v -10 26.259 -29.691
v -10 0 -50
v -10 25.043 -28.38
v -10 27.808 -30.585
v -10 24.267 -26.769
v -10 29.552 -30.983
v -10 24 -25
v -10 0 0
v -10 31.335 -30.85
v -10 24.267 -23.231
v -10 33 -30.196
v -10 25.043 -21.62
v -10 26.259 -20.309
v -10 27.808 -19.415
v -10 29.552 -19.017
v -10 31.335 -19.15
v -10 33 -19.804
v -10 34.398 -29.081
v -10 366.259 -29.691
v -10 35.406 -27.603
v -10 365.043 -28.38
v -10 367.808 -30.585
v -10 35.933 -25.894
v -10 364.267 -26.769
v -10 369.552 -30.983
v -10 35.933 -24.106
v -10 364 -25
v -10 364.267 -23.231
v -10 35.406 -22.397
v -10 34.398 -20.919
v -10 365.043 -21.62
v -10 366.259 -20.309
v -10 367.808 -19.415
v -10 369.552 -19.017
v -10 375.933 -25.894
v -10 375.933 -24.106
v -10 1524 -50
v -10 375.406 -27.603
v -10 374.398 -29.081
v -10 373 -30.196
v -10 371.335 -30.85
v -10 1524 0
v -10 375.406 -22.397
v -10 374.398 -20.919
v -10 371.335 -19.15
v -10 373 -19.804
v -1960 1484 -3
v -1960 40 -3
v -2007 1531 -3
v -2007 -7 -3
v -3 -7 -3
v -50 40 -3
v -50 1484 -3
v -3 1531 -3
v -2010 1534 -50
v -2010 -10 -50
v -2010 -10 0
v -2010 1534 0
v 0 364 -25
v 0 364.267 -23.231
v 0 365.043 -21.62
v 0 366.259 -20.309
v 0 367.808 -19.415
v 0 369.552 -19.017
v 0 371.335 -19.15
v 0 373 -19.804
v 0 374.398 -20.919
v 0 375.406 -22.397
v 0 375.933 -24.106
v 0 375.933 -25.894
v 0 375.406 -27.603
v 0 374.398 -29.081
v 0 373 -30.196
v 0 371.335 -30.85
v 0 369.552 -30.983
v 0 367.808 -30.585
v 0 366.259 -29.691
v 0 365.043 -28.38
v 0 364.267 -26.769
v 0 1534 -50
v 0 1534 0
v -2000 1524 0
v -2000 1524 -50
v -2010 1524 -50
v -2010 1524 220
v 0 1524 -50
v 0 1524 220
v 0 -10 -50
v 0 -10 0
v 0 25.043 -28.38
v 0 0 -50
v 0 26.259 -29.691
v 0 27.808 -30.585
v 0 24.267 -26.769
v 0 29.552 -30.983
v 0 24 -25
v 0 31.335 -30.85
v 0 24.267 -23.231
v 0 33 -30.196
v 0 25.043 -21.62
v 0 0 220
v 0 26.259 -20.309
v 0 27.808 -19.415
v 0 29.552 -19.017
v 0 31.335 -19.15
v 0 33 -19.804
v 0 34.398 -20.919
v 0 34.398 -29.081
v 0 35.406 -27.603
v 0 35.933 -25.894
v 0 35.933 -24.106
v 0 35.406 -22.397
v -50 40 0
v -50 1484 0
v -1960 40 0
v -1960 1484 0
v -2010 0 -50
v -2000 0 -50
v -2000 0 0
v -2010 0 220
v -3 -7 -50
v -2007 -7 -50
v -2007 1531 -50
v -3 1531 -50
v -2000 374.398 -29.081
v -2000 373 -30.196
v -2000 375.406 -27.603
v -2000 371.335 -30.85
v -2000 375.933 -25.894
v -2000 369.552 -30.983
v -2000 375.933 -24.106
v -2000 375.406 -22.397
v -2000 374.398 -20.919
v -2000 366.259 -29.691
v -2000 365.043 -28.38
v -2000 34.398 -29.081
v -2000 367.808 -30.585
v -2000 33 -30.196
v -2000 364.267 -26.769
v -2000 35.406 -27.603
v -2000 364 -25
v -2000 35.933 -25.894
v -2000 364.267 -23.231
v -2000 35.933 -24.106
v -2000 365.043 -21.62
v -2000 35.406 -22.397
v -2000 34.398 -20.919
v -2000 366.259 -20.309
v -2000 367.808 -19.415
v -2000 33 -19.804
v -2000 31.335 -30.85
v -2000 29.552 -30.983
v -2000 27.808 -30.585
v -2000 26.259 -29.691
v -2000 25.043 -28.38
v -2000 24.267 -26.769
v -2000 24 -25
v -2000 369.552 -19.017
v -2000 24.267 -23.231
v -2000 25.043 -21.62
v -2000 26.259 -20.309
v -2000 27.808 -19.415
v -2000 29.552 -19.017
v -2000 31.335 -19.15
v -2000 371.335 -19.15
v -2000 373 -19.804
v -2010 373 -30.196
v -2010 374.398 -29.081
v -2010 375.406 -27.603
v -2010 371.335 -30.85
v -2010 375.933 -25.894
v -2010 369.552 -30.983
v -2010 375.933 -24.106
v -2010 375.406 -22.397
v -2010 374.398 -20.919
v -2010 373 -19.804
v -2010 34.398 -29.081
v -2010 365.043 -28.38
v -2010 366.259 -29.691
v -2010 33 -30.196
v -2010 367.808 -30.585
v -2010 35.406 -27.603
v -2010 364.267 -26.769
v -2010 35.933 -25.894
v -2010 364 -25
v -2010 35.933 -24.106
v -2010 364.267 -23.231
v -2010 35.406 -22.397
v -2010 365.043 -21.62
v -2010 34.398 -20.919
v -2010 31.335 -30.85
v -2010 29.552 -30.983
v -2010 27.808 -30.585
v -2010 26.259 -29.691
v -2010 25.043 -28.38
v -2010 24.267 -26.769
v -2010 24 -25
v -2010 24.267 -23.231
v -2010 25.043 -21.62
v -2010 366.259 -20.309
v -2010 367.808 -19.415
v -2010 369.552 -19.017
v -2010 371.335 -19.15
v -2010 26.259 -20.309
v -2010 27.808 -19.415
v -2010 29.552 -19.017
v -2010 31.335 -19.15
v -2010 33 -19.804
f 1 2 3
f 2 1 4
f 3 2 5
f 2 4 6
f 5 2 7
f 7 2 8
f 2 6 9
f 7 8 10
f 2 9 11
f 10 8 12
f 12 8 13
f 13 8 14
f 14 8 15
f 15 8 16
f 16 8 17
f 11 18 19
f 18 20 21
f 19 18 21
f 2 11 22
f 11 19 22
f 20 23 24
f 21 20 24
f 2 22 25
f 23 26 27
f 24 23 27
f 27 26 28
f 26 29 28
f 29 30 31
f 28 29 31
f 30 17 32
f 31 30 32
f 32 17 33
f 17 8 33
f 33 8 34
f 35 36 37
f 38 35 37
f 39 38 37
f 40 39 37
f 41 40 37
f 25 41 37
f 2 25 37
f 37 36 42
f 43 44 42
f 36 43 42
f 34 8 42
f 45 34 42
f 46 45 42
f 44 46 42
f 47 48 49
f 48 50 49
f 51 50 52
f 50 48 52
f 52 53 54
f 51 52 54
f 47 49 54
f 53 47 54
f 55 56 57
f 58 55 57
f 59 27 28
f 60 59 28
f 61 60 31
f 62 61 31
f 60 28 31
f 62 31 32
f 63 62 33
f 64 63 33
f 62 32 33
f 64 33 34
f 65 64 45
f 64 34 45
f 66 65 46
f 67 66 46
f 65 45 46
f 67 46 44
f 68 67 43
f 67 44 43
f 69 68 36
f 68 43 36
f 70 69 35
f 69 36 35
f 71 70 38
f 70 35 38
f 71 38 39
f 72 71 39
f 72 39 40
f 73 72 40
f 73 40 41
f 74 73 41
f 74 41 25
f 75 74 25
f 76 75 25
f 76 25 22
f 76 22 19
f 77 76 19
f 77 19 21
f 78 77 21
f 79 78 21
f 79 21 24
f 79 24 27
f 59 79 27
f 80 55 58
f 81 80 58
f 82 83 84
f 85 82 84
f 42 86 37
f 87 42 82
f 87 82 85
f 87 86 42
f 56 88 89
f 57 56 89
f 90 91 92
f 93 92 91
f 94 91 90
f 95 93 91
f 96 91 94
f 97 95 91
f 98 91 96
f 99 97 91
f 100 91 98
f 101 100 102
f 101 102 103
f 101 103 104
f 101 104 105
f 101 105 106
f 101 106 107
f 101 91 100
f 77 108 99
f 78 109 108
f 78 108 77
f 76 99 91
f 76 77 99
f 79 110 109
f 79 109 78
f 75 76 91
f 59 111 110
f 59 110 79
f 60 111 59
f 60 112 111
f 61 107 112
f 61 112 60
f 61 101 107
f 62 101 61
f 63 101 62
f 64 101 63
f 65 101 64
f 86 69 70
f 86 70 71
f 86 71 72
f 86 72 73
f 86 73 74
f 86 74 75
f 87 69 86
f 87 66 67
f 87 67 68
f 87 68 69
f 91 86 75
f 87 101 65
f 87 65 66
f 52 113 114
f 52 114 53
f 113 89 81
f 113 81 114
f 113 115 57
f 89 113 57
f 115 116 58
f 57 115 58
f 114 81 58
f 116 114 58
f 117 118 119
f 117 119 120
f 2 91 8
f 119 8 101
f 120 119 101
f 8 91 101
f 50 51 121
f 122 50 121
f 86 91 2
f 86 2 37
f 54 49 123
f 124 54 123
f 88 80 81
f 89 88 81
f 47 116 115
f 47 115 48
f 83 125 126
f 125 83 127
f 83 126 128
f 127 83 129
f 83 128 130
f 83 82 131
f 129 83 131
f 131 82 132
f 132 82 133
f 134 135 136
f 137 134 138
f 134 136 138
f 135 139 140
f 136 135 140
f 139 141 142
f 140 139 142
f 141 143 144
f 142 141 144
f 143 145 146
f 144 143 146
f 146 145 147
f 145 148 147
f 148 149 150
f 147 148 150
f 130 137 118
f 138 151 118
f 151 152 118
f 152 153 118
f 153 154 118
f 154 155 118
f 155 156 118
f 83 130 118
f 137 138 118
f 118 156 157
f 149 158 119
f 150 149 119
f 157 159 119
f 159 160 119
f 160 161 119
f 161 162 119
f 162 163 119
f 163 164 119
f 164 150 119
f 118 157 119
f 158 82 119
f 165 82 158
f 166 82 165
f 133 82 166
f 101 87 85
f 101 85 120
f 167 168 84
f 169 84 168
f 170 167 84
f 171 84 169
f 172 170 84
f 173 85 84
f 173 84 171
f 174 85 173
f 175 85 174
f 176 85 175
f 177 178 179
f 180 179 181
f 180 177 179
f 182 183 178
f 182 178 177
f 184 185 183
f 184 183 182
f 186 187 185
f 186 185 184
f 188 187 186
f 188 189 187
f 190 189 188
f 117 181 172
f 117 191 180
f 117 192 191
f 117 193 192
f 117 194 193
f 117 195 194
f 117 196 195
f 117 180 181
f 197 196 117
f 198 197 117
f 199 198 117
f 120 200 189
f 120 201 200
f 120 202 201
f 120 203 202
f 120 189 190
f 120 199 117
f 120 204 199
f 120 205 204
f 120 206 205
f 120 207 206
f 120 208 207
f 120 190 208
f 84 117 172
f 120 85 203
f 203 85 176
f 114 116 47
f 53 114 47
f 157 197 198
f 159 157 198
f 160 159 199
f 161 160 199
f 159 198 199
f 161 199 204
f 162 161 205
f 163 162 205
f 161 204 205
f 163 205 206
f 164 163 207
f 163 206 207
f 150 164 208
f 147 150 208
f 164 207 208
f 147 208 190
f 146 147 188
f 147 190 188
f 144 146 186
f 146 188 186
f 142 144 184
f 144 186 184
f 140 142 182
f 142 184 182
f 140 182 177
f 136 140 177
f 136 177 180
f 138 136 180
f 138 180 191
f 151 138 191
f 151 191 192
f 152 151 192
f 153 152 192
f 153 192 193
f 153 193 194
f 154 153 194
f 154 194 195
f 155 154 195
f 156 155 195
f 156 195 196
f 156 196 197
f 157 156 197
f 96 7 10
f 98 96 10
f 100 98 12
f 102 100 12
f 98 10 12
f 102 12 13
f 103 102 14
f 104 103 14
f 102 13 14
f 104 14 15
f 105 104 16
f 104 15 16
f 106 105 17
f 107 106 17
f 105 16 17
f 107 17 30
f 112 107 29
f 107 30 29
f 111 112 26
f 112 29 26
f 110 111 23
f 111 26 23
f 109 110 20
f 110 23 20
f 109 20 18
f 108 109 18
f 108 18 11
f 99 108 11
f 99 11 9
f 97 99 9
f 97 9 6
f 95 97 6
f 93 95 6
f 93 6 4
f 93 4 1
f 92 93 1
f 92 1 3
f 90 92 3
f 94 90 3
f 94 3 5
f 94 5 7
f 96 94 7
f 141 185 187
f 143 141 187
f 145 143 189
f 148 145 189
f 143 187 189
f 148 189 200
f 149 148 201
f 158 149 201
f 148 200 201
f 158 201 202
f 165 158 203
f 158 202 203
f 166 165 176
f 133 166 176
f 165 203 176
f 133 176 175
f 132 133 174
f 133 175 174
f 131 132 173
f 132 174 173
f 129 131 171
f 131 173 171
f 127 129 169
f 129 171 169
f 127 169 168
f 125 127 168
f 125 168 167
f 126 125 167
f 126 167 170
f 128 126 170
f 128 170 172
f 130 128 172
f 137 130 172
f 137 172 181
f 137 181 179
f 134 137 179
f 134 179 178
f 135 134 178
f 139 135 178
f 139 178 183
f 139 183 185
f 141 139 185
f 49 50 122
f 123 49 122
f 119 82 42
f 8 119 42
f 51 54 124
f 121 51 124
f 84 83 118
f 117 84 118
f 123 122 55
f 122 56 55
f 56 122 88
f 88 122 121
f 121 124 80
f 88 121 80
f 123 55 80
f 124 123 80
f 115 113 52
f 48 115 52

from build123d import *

# Parameters (mm, degrees)
F0_W     = 2000
F0_H     = 1524
F1_DEPTH = 220
F2_W     = 1524
F2_H     = 270
F3_DEPTH = 10
F4_W     = 1524
F4_H     = 270
F5_DEPTH = 10
F7_D     = 12
F8_D     = 12


with BuildPart() as f1:
    # F0 (on Top) → F1 (new body)
    with BuildSketch(Plane.XY):
        with Locations((-1000, 762)):
            Rectangle(F0_W, F0_H)
    extrude(amount=F1_DEPTH)

    # F2 (on face) → F3 (join)
    with BuildSketch(Plane.YZ):
        with Locations((762, 85)):
            Rectangle(F2_W, F2_H)
    extrude(amount=-F3_DEPTH)

    # F4 (on face) → F5 (join)
    with BuildSketch(Plane(origin=(-2000, 0, 0), x_dir=(0, -1, 0), z_dir=(-1, 0, 0))):
        with Locations((-762, 85)):
            Rectangle(F4_W, F4_H)
    extrude(amount=F5_DEPTH)

    # F7 (through all)
    with Locations(Plane.YZ):
        with Locations((30, -25)):
            Hole(F7_D / 2)

    # F8 (through all)
    with Locations(Plane.YZ):
        with Locations((370, -25)):
            Hole(F8_D / 2)


with BuildPart() as f10:
    # F10: sweep along a path in F10_path
    with BuildLine(Plane(origin=(-10, 0, 0), x_dir=(0, -1, 0), z_dir=(0, 0, -1))) as f10_path:
        Line((0, 0), (-1524, 0))
        Line((-1524, 0), (-1524, 1990))
        Line((-1524, 1990), (0, 1990))
        Line((0, 1990), (0, 0))
    # F9 (on Front) → F10 (sweep)
    with BuildSketch(Plane.XZ):
        Polygon((0, -50), (0, 0), (-50, 0), (-50, -3), (-3, -3), (-3, -50), align=None)
    sweep(path=f10_path.line, transition=Transition.RIGHT)


solid = Compound([f1.part, f10.part])
